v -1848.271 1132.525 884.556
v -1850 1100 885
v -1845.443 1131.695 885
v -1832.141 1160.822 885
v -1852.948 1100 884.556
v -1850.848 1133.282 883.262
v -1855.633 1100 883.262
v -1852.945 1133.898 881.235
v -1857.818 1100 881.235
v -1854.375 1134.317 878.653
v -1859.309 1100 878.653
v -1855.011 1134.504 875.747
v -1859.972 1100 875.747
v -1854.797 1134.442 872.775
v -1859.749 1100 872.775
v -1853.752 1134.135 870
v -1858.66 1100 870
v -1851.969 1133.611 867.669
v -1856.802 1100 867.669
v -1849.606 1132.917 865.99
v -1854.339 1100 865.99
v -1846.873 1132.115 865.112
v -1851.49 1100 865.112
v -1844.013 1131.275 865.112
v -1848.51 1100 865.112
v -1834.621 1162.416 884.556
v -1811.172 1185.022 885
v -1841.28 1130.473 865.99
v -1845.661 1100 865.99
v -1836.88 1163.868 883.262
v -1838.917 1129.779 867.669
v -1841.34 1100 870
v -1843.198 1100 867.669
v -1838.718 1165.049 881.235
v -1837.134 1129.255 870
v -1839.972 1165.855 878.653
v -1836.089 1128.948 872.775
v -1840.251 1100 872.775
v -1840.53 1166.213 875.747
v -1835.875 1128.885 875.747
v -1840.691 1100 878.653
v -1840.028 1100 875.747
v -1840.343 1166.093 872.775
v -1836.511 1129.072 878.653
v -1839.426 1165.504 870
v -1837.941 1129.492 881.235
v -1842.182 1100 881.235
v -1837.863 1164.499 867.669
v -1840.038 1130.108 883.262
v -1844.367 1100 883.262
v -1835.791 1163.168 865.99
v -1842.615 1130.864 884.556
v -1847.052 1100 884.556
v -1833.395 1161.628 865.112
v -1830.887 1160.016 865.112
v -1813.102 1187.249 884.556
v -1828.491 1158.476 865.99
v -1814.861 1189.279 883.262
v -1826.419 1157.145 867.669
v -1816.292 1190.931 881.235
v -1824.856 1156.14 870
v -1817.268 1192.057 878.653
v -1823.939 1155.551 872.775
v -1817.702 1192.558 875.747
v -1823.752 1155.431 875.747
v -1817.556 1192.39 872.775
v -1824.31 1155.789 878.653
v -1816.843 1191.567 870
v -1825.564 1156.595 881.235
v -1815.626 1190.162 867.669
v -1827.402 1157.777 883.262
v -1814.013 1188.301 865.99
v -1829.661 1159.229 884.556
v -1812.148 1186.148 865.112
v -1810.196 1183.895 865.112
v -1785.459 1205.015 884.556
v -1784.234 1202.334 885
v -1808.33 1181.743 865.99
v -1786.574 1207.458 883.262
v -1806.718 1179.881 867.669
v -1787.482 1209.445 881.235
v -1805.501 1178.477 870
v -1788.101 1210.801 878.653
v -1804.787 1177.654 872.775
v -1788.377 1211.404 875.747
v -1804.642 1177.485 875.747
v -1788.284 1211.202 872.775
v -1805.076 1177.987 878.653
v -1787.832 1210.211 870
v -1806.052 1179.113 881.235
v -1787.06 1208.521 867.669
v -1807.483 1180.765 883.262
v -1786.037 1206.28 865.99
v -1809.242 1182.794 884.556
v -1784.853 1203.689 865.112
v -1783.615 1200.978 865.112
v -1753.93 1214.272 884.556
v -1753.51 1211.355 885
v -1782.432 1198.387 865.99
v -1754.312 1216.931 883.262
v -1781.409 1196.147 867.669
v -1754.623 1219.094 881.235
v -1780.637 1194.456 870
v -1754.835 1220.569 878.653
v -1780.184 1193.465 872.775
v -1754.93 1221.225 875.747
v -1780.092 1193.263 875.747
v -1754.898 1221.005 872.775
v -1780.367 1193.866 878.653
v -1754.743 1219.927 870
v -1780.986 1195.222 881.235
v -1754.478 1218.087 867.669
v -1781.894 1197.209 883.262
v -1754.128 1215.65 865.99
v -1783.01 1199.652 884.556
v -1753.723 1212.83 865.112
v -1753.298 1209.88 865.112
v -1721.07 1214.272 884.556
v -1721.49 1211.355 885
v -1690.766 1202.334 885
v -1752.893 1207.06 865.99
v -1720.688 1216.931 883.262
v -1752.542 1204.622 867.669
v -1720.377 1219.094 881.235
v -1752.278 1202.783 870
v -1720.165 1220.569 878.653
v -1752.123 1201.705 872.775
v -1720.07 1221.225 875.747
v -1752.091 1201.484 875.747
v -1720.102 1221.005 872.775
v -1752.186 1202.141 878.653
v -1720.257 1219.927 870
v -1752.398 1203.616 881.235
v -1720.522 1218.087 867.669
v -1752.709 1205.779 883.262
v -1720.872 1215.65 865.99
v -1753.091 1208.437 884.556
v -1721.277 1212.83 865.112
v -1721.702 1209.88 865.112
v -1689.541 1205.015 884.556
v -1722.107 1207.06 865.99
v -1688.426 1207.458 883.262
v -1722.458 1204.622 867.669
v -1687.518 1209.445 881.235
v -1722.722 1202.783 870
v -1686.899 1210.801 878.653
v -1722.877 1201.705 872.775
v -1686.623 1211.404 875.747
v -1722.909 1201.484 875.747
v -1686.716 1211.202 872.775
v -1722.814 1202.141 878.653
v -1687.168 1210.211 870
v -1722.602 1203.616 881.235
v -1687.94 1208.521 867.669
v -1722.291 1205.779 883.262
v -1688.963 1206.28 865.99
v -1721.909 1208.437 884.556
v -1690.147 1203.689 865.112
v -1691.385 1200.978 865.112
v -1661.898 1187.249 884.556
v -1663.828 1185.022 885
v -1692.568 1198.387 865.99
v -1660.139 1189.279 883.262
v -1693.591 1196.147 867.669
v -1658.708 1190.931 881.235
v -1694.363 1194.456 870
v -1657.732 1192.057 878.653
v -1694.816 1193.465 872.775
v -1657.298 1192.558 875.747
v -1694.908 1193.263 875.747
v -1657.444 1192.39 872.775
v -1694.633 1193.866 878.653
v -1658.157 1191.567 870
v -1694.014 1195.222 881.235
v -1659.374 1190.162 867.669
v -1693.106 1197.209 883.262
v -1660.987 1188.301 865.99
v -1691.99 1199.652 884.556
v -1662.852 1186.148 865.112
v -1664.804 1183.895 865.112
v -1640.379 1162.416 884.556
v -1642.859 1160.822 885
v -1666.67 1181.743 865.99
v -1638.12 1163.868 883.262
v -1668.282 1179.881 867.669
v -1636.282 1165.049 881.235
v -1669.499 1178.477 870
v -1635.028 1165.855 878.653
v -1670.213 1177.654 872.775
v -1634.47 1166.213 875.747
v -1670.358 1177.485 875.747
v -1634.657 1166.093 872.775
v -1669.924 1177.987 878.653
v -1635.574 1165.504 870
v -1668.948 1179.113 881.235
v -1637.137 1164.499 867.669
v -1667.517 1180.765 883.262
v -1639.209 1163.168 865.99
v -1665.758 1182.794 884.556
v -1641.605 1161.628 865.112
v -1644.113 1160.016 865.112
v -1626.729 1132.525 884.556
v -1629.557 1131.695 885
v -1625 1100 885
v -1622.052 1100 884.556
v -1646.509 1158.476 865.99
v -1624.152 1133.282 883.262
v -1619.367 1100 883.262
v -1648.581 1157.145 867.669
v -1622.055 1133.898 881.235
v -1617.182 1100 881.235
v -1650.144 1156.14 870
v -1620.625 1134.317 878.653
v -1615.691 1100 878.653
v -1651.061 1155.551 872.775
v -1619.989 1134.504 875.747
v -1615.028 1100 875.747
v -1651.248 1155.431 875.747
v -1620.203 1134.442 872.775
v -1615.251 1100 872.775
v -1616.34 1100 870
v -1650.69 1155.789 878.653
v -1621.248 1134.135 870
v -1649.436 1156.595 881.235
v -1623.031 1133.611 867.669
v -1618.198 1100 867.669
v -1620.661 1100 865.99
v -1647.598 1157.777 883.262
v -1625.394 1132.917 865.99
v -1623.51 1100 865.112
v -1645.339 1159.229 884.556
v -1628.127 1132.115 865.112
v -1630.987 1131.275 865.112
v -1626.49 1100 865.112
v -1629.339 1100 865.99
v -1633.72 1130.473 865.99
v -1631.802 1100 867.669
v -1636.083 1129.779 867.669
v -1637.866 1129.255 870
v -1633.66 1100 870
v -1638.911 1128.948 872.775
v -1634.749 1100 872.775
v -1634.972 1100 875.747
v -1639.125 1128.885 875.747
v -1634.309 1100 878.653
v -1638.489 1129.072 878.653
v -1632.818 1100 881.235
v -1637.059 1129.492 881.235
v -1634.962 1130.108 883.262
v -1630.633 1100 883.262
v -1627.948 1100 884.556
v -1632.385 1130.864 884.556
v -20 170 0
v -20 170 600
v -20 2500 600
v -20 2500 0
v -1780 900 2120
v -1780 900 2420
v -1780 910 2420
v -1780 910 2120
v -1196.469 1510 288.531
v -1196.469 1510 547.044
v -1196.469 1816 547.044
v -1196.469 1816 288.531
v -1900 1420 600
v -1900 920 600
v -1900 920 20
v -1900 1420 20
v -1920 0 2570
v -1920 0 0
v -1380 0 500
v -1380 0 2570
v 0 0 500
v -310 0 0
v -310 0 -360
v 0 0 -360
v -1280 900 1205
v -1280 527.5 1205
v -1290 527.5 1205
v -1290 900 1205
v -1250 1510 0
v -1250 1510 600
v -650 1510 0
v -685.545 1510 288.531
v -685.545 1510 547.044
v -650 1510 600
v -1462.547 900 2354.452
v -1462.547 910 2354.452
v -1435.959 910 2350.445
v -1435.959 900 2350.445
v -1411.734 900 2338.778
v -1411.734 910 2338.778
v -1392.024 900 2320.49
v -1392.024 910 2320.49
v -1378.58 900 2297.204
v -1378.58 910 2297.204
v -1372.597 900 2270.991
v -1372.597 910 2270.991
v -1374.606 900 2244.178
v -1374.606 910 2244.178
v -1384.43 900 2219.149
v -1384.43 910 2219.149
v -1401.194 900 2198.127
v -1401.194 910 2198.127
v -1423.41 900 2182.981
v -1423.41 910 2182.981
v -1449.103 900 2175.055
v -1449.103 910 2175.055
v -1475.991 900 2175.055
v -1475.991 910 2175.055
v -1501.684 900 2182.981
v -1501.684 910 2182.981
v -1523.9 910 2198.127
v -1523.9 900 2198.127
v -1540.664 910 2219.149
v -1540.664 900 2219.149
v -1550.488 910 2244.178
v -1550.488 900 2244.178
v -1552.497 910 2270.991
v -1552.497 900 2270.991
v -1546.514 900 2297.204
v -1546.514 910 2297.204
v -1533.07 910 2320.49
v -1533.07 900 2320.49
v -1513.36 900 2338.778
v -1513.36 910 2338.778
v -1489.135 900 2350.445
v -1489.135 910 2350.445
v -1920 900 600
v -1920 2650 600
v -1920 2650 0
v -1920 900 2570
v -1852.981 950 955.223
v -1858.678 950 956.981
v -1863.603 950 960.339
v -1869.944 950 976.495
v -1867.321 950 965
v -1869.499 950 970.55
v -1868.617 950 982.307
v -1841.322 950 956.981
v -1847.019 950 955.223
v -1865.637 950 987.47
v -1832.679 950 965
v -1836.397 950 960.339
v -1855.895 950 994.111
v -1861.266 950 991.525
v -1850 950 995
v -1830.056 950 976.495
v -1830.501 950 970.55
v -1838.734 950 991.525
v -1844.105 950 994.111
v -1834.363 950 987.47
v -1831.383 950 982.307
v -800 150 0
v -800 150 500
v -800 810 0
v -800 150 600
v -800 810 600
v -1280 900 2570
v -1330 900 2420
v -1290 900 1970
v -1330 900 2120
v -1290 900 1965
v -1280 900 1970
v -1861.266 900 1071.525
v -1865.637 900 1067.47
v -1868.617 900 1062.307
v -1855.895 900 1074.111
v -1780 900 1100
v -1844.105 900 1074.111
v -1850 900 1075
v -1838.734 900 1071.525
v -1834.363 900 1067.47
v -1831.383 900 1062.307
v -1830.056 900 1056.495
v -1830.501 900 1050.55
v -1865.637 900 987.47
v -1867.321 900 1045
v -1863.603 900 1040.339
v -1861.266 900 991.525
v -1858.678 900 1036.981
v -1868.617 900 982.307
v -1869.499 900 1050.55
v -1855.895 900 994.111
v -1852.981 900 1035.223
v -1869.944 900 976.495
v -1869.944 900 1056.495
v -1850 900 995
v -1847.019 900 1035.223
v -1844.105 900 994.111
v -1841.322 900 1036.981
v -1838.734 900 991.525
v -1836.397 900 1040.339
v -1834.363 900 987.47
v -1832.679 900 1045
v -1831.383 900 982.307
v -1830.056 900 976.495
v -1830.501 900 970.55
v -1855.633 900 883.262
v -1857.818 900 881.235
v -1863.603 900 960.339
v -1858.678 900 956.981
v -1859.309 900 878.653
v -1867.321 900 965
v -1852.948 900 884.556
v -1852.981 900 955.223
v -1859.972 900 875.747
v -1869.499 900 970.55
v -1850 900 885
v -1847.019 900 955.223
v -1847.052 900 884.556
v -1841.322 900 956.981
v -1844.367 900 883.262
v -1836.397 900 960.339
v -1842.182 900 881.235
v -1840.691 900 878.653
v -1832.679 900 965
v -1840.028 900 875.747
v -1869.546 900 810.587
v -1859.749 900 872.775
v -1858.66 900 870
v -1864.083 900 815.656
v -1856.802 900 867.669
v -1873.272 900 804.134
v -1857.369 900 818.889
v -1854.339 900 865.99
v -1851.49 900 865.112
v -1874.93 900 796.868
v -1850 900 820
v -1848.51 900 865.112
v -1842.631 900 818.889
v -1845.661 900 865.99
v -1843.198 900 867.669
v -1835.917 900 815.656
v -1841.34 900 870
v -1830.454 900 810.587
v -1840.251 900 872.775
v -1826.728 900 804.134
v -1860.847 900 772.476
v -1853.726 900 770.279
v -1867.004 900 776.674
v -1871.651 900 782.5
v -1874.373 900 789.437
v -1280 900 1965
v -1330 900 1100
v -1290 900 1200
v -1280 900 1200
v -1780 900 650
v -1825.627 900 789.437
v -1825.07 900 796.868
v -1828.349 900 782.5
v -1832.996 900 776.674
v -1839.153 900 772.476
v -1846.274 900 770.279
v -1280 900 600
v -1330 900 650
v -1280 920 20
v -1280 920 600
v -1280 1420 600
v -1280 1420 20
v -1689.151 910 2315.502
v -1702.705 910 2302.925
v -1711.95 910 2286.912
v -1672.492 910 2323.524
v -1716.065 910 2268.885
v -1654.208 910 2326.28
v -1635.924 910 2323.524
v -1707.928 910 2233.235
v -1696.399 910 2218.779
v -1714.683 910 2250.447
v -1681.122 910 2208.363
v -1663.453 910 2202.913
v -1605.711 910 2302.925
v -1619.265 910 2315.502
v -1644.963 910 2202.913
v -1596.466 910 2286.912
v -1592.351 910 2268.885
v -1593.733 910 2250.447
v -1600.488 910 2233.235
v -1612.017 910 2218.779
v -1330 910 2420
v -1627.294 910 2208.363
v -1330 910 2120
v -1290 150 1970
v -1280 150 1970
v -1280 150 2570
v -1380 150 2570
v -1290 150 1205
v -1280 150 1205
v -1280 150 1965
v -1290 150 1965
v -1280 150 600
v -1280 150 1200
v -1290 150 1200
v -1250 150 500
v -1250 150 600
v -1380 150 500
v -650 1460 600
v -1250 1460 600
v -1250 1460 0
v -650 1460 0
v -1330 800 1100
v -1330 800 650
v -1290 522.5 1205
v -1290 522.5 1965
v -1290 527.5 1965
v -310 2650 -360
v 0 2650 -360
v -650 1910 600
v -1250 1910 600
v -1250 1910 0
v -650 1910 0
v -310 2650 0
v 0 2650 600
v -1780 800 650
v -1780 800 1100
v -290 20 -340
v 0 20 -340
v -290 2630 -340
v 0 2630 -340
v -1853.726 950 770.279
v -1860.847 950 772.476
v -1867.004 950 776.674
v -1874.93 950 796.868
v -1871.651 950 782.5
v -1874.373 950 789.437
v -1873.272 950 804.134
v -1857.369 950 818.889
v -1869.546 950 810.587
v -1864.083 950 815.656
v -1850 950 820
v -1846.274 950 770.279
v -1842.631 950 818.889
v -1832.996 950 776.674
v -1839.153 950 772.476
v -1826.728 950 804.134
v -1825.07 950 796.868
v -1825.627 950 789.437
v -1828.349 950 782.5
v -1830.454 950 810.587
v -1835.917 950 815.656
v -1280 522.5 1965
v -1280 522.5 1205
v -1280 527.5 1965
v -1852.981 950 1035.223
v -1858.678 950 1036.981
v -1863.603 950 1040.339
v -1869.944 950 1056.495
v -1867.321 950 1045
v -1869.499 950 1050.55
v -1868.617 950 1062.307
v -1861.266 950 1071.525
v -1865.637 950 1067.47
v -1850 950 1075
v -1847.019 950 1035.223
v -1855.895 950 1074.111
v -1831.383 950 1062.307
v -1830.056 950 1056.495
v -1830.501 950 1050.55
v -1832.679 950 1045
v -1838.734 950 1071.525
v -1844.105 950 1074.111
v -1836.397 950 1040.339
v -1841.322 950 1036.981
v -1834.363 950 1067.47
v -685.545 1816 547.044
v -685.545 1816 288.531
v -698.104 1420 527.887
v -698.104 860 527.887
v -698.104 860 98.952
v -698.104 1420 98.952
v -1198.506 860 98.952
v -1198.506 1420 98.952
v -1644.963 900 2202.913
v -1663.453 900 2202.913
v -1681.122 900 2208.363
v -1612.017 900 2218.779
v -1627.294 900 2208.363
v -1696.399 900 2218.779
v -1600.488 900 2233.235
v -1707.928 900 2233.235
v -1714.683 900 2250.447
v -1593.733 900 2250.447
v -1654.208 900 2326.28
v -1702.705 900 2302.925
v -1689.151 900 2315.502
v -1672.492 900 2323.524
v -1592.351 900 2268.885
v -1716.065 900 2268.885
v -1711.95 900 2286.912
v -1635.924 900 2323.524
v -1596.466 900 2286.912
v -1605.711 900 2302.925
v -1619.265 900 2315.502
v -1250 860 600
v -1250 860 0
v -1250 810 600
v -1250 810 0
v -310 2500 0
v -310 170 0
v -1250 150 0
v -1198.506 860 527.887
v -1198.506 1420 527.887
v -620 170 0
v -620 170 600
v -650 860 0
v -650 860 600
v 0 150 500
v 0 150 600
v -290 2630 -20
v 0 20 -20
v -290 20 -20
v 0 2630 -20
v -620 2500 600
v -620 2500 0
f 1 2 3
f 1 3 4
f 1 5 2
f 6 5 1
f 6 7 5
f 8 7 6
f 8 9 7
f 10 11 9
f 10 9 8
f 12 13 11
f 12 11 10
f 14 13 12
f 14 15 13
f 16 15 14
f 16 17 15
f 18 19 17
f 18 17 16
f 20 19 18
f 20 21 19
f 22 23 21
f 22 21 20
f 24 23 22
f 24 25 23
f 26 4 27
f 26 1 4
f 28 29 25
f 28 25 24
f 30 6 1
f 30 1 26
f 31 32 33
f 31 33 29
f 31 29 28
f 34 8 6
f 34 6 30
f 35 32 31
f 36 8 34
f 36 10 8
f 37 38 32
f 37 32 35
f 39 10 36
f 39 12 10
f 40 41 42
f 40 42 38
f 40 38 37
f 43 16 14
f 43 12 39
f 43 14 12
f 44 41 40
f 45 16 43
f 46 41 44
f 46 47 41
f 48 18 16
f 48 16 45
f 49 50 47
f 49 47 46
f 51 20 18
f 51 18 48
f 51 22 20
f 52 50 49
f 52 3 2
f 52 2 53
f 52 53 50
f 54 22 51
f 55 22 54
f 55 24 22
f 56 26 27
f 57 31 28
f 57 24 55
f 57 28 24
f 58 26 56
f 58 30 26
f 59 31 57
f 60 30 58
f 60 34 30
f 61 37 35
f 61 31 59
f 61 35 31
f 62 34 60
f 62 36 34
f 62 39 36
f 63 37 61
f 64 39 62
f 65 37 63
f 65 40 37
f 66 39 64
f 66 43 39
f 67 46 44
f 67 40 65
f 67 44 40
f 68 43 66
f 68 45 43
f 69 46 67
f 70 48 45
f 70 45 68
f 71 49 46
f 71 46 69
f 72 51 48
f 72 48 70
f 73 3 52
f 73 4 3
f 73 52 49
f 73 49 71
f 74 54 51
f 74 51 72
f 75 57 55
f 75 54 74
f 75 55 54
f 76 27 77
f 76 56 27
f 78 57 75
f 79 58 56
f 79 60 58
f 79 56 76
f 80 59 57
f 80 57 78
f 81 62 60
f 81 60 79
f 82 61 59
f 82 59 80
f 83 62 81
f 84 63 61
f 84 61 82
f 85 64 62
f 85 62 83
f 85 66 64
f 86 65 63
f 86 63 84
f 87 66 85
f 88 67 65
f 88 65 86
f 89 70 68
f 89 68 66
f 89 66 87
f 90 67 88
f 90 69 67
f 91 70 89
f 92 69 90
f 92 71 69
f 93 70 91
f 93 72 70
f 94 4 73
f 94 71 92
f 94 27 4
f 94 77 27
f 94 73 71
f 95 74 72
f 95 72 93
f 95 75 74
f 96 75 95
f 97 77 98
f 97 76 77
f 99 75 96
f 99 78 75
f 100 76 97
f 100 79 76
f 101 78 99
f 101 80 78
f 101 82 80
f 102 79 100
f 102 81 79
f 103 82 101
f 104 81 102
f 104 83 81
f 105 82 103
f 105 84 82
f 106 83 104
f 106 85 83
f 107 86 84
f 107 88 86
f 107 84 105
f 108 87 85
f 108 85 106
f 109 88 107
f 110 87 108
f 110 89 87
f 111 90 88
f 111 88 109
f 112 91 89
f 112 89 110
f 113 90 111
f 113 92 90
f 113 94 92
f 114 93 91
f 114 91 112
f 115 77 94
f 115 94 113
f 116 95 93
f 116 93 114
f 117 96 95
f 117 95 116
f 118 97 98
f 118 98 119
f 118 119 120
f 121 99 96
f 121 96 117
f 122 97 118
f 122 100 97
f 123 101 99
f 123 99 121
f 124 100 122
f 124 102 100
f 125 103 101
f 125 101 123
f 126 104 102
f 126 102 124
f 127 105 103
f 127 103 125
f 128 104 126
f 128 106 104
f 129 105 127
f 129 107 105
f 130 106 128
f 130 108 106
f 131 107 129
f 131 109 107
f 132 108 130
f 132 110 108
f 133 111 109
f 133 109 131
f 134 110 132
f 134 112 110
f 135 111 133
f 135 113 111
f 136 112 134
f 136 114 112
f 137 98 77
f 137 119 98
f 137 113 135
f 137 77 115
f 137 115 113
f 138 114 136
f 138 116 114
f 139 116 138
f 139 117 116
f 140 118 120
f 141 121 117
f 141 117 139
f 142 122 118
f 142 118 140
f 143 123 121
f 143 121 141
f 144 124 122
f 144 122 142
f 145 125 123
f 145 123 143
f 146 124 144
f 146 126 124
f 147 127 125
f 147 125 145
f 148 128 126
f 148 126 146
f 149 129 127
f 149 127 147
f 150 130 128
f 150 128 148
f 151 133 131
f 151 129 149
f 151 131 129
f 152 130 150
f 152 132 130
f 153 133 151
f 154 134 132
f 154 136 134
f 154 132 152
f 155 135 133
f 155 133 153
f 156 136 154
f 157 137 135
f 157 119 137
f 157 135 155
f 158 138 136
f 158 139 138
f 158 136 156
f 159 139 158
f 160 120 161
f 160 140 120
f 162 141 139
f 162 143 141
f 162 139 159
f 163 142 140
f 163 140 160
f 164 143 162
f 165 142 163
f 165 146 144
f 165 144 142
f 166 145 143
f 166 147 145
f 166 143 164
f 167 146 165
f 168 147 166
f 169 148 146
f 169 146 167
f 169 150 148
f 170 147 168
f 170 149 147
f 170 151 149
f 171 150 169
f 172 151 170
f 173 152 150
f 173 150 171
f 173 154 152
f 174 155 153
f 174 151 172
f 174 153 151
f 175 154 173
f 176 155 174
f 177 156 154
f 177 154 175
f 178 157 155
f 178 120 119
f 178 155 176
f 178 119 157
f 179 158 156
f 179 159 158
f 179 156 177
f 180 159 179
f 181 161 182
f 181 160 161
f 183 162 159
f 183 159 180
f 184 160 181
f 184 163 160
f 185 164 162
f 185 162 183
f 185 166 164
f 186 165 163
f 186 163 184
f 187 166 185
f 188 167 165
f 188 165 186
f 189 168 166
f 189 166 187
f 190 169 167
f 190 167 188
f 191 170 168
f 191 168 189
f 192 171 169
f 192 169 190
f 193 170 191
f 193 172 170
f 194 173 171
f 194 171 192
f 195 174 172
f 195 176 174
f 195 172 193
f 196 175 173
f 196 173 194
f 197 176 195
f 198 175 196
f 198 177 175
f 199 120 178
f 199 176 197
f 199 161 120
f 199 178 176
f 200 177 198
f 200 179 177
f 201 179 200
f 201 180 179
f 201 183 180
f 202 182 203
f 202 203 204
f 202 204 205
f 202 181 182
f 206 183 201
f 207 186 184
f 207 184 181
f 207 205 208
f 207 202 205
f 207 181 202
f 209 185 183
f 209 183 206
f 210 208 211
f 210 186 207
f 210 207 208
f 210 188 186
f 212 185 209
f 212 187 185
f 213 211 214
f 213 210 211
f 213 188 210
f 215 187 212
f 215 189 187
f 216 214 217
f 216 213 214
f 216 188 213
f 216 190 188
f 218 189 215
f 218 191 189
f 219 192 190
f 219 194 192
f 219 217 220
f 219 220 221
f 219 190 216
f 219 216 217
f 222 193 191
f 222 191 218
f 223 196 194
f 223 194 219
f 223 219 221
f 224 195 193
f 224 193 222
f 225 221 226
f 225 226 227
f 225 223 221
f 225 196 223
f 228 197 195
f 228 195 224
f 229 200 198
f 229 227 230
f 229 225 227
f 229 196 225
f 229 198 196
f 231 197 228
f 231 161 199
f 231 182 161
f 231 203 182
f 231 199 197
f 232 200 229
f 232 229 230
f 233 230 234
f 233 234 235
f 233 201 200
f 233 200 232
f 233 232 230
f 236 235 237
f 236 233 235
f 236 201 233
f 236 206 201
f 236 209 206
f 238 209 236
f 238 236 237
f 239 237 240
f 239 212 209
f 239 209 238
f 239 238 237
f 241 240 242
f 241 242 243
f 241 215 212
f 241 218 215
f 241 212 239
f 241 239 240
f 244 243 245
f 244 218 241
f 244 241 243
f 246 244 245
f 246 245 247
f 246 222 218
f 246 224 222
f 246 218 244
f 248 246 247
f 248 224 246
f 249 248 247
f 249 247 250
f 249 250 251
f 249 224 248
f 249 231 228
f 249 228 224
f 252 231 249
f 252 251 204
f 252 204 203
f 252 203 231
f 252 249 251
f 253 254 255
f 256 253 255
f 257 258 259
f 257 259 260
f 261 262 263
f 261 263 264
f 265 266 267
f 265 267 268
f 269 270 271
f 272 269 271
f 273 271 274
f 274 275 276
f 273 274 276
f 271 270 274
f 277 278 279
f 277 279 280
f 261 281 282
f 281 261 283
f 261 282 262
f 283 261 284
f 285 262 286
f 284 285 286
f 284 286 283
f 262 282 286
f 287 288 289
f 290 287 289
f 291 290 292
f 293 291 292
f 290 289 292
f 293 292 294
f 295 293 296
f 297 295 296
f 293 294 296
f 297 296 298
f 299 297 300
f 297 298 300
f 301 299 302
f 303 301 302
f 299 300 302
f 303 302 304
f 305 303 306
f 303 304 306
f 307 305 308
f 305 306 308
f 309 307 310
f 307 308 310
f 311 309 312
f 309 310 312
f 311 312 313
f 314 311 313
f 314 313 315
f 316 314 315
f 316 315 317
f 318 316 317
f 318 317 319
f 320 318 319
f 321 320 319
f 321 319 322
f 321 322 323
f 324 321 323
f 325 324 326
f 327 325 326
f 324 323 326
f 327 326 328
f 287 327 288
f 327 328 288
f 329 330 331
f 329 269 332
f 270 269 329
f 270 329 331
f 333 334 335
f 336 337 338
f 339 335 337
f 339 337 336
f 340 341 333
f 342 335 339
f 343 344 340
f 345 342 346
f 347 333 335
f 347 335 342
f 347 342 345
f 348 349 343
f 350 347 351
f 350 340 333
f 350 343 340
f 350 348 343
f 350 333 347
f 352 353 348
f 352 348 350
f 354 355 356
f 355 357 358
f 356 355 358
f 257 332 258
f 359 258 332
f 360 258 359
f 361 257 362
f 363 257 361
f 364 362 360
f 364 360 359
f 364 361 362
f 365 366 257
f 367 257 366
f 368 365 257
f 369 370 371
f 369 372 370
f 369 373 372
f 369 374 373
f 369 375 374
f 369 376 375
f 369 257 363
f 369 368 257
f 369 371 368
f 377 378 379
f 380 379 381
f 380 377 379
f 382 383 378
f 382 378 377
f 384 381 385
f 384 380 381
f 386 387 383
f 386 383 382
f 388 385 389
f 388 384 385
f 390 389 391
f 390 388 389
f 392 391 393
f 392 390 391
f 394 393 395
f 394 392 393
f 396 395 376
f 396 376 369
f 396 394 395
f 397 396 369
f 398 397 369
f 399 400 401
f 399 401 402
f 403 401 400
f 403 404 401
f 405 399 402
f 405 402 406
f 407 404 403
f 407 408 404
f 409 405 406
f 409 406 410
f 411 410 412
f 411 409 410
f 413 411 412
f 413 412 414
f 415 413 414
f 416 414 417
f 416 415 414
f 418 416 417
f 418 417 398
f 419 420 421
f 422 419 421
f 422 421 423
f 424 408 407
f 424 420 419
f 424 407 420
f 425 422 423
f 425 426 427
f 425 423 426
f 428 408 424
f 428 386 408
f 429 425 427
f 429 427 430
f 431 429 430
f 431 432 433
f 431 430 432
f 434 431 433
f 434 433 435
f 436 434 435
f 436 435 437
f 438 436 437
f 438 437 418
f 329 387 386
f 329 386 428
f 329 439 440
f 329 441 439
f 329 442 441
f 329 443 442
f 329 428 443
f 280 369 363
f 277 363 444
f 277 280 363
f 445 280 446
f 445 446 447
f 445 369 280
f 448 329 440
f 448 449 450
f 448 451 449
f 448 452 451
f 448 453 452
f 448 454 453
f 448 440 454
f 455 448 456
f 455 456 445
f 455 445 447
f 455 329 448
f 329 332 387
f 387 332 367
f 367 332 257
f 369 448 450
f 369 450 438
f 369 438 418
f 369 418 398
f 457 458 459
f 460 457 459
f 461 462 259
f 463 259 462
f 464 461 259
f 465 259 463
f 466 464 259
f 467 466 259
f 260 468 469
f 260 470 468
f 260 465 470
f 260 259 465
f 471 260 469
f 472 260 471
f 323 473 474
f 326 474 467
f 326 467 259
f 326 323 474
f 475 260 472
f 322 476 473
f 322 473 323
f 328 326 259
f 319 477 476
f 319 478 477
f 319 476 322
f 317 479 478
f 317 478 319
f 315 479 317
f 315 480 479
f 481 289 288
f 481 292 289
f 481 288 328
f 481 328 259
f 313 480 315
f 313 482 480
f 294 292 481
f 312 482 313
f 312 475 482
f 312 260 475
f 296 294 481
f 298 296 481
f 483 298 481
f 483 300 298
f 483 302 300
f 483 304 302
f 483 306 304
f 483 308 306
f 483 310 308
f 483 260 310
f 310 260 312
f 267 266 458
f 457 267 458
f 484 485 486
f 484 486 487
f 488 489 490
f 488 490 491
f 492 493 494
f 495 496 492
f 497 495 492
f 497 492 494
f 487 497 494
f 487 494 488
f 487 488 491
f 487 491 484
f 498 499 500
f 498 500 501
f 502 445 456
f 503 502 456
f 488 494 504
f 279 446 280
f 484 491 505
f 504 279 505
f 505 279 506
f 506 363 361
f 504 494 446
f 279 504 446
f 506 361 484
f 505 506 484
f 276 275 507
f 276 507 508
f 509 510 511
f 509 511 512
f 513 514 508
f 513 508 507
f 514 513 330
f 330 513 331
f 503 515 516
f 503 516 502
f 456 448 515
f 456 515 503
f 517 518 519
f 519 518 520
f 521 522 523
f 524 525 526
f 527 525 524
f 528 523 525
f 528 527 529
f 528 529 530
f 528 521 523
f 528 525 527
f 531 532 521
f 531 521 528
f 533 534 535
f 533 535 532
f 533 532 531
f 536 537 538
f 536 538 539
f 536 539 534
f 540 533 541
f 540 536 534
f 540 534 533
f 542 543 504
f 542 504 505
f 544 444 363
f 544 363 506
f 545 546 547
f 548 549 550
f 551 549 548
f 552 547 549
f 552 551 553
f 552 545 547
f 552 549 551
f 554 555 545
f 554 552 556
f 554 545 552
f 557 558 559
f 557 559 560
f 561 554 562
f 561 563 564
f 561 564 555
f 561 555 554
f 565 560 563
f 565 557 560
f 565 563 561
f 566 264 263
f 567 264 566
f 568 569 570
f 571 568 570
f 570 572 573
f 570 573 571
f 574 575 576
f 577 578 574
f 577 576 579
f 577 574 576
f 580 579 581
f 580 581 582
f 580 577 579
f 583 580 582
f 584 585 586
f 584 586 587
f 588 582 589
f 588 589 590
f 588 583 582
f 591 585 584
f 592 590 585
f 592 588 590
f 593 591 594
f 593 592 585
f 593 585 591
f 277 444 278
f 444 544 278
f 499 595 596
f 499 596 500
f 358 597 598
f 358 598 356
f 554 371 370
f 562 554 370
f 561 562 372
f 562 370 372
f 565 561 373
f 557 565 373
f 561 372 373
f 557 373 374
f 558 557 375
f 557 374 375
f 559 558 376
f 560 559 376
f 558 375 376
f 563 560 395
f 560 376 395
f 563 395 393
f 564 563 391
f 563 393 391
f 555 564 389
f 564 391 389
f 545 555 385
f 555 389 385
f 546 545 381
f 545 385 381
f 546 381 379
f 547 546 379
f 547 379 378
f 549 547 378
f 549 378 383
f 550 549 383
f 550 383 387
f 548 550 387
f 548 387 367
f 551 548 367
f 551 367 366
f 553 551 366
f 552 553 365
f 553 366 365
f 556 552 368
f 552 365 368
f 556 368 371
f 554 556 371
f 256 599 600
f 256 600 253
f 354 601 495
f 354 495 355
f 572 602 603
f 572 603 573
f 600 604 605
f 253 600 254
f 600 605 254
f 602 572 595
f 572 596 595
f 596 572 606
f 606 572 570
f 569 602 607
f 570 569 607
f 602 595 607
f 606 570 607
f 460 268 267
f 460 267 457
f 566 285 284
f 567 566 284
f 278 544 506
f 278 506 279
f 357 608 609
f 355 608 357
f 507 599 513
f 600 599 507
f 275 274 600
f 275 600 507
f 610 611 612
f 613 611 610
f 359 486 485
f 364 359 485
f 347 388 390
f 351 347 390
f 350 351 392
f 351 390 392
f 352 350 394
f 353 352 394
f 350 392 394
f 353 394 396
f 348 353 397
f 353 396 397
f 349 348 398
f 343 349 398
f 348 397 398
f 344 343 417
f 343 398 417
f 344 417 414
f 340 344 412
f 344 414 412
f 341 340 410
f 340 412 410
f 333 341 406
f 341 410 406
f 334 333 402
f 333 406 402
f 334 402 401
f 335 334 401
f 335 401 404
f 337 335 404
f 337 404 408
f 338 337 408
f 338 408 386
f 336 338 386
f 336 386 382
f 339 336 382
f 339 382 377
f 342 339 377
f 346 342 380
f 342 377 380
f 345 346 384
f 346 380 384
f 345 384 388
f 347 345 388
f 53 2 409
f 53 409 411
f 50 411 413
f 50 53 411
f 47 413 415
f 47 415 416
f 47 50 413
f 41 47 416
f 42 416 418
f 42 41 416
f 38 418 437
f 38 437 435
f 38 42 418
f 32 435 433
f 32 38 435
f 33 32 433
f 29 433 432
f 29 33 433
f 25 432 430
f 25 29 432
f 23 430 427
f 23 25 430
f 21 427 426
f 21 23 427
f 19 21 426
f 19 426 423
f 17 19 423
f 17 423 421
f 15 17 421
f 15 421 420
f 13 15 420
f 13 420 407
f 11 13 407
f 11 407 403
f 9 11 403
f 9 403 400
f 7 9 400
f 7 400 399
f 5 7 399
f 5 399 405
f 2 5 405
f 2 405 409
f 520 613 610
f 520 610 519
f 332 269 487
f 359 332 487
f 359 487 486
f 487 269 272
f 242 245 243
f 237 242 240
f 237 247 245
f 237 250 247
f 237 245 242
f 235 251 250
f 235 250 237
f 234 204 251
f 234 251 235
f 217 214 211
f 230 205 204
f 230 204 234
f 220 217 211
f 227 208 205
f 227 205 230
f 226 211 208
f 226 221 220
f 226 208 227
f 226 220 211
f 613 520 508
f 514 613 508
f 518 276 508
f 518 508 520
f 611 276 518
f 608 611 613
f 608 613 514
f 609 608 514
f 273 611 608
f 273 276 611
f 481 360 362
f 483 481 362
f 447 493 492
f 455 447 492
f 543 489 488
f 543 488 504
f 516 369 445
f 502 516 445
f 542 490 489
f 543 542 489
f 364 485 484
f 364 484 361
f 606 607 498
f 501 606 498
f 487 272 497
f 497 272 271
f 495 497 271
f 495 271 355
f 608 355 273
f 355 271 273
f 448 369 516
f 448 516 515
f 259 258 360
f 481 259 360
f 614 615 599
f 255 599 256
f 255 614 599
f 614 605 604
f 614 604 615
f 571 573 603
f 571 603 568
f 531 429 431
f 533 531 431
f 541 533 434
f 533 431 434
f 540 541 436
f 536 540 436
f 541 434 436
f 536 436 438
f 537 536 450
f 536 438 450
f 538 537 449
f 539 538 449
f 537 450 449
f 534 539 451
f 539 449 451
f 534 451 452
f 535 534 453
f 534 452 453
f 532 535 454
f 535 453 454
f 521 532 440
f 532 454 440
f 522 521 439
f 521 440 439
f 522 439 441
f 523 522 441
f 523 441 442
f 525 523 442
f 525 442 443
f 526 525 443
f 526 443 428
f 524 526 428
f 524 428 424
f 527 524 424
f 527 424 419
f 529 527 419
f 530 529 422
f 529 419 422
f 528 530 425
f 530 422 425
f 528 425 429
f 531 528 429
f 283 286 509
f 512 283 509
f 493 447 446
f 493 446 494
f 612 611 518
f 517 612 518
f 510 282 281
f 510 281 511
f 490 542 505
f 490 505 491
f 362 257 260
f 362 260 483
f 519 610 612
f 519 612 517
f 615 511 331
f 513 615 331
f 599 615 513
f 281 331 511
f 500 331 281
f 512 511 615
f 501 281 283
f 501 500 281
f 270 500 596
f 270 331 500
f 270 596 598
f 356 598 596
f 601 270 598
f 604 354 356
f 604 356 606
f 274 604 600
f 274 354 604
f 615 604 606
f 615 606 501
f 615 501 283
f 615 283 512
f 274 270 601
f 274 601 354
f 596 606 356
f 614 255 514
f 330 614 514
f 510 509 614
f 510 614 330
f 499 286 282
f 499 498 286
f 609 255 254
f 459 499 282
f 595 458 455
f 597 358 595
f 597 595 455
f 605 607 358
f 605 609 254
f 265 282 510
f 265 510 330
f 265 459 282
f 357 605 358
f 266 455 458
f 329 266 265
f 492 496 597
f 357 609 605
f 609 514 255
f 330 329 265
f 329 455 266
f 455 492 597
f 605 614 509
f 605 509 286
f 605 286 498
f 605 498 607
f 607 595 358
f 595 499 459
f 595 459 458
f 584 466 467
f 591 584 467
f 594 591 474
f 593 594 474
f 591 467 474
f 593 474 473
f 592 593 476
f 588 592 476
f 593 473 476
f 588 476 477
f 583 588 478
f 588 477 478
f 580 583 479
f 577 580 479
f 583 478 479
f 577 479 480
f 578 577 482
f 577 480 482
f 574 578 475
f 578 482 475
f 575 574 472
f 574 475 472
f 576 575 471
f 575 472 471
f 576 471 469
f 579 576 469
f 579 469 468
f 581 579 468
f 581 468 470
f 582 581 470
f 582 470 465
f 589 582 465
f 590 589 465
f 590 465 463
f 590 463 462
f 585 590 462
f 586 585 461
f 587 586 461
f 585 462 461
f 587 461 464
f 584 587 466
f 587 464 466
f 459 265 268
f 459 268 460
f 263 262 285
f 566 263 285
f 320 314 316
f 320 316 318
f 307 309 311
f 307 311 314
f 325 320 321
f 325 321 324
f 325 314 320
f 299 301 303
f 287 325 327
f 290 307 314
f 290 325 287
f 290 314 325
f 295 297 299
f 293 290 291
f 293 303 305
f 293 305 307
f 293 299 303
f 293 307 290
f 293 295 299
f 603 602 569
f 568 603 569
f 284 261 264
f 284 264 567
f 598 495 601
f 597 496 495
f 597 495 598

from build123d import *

# Parameters (mm, degrees)
EXTRUDE_1_DEPTH      = 900
EXTRUDE_2_DEPTH      = 1750
CUT_EXTRUDE_1_DEPTH  = 150
SKETCH_5_W           = 600
SKETCH_5_H           = 2330
CUT_EXTRUDE_3_DEPTH  = 600
CUT_EXTRUDE_4_REACH  = 3821.66
SKETCH_6_W           = 450
SKETCH_6_H           = 660
SKETCH_7_W           = 600
SKETCH_7_H           = 600
CUT_EXTRUDE_5_DEPTH  = 600
SKETCH_8_W           = 600
SKETCH_8_H           = 400
CUT_EXTRUDE_6_DEPTH  = 600
SKETCH_9_W           = 320
SKETCH_9_H           = 2610
CUT_EXTRUDE_7_DEPTH  = 290
SKETCH_10_W          = 450
SKETCH_10_H          = 450
CUT_EXTRUDE_8_DEPTH  = 100
SKETCH_11_W          = 620
SKETCH_11_H          = 500
CUT_EXTRUDE_9_DEPTH  = 580
SKETCH_12_W          = 450
SKETCH_12_H          = 300
EXTRUDE_3_DEPTH      = 10
SKETCH_13_R          = 62.030124837
SKETCH_13_R_2        = 90.202132014
CUT_EXTRUDE_10_DEPTH = 10
CUT_EXTRUDE_11_DEPTH = 10
SWEEP_1_PROFILE_R    = 10
SKETCH_21_R          = 20
SKETCH_21_R_2        = 25
EXTRUDE_4_DEPTH      = 50
SKETCH_22_W          = 510.923596237
SKETCH_22_H          = 258.513078401
EXTRUDE_5_DEPTH      = 306
SKETCH_23_W          = 500.401819184
SKETCH_23_H          = 428.934094681
EXTRUDE_6_DEPTH      = 560


with BuildPart() as part:
    # Эскиз1 → Бобышка-Вытянуть1 (new body)
    with BuildSketch(Plane(origin=(0, 0, 0), x_dir=(1, 0, 0), z_dir=(0, 1, 0))):
        Polygon((-310, 0), (-1920, 0), (-1920, -2570), (-1280, -2570), (-1280, -600), (0, -600), (0, 0), (0, 360), (-310, 360), align=None)
    extrude(amount=EXTRUDE_1_DEPTH)

    # Эскиз2 → Бобышка-Вытянуть2 (add)
    with BuildSketch(Plane(origin=(0, 900, 0), x_dir=(1, 0, 0), z_dir=(0, 1, 0))):
        Polygon((-1920, 0), (-310, 0), (-310, 360), (0, 360), (0, -600), (-1920, -600), align=None)
    extrude(amount=EXTRUDE_2_DEPTH)

    # Эскиз4 → Вырез-Вытянуть1 (cut)
    with BuildSketch(Plane(origin=(0, 0, 0), x_dir=(-1, 0, 0), z_dir=(0, -1, 0))):
        Polygon((1280, -2570), (1380, -2570), (1380, -500), (0, -500), (0, -600), (1280, -600), align=None)
    extrude(amount=-CUT_EXTRUDE_1_DEPTH, mode=Mode.SUBTRACT)

    # Эскиз5 → Вырез-Вытянуть3 (cut)
    with BuildSketch(Plane.XY.offset(600)):
        with Locations((-320, 1335)):
            Rectangle(SKETCH_5_W, SKETCH_5_H)
    extrude(amount=-CUT_EXTRUDE_3_DEPTH, mode=Mode.SUBTRACT)

    # Вырез-Вытянуть4: up to this face of the body (flat: up to its plane)
    cut_extrude_4_end = Plane(part.part.faces().sort_by_distance((-1247.46854015, 1322.962022459, 0))[0])
    # Эскиз6 → Вырез-Вытянуть4 (cut, up to the picked face)
    with BuildSketch(Plane.XY.offset(600), mode=Mode.PRIVATE) as cut_extrude_4_sk1:
        with Locations((-1025, 480)):
            Rectangle(SKETCH_6_W, SKETCH_6_H)
    cut_extrude_4_tool1 = split(extrude(cut_extrude_4_sk1.sketch, amount=-CUT_EXTRUDE_4_REACH, mode=Mode.PRIVATE), bisect_by=cut_extrude_4_end, keep=Keep.BOTH, mode=Mode.PRIVATE)
    add(cut_extrude_4_tool1.solids().sort_by(Axis((-1025, 480, 600), (0, 0, -1)))[0], mode=Mode.SUBTRACT)

    # Эскиз7 → Вырез-Вытянуть5 (cut)
    with BuildSketch(Plane.XY.offset(600)):
        with Locations((-950, 1160)):
            Rectangle(SKETCH_7_W, SKETCH_7_H)
    extrude(amount=-CUT_EXTRUDE_5_DEPTH, mode=Mode.SUBTRACT)

    # Эскиз8 → Вырез-Вытянуть6 (cut)
    with BuildSketch(Plane.XY.offset(600)):
        with Locations((-950, 1710)):
            Rectangle(SKETCH_8_W, SKETCH_8_H)
    extrude(amount=-CUT_EXTRUDE_6_DEPTH, mode=Mode.SUBTRACT)

    # Эскиз9 → Вырез-Вытянуть7 (cut)
    with BuildSketch(Plane(origin=(0, 0, 0), x_dir=(0, 0, -1), z_dir=(1, 0, 0))):
        with Locations((180, 1325)):
            Rectangle(SKETCH_9_W, SKETCH_9_H)
    extrude(amount=-CUT_EXTRUDE_7_DEPTH, mode=Mode.SUBTRACT)

    # Эскиз10 → Вырез-Вытянуть8 (cut)
    with BuildSketch(Plane(origin=(0, 900, 0), x_dir=(1, 0, 0), z_dir=(0, 1, 0))):
        with Locations((-1555, -875)):
            Rectangle(SKETCH_10_W, SKETCH_10_H)
    extrude(amount=-CUT_EXTRUDE_8_DEPTH, mode=Mode.SUBTRACT)

    # Эскиз11 → Вырез-Вытянуть9 (cut)
    with BuildSketch(Plane.XY.offset(600)):
        with Locations((-1590, 1170)):
            Rectangle(SKETCH_11_W, SKETCH_11_H)
    extrude(amount=-CUT_EXTRUDE_9_DEPTH, mode=Mode.SUBTRACT)

    # Эскиз12 → Бобышка-Вытянуть3 (add)
    with BuildSketch(Plane(origin=(0, 900, 0), x_dir=(1, 0, 0), z_dir=(0, 1, 0))):
        with Locations((-1555, -2270)):
            Rectangle(SKETCH_12_W, SKETCH_12_H)
    extrude(amount=EXTRUDE_3_DEPTH)

    # Эскиз13 → Вырез-Вытянуть10 (cut)
    with BuildSketch(Plane(origin=(0, 910, 0), x_dir=(1, 0, 0), z_dir=(0, 1, 0))):
        with Locations(Location((-1654.208045563, -2264.249851764, 0), (0, 0, 270))):
            Circle(SKETCH_13_R)
        with Locations(Location((-1462.546999968, -2264.249851764, 0), (0, 0, 270))):
            Circle(SKETCH_13_R_2)
    extrude(amount=-CUT_EXTRUDE_10_DEPTH, mode=Mode.SUBTRACT)

    # Эскиз14 → Вырез-Вытянуть11 (cut)
    with BuildSketch(Plane(origin=(-1280, 0, 0), x_dir=(0, 0, -1), z_dir=(1, 0, 0))):
        Polygon((-1970, 900), (-1965, 900), (-1965, 527.5), (-1205, 527.5), (-1205, 900), (-1200, 900), (-1200, 150), (-1205, 150), (-1205, 522.5), (-1965, 522.5), (-1965, 150), (-1970, 150), align=None)
    extrude(amount=-CUT_EXTRUDE_11_DEPTH, mode=Mode.SUBTRACT)

    # По траектории1: sweep along a curve in space
    with BuildLine() as sweep_1_path:
        Line((-1850, 900, 875), (-1850, 1100, 875))
        ThreePointArc((-1850, 1100, 875), (-1737.5, 1212.5, 875), (-1625, 1100, 875))
    # По траектории1 profile (on start of the path) → По траектории1 (sweep)
    with BuildSketch(Plane(origin=(-1850, 900, 875), x_dir=(0, 0, 1), z_dir=(0, 1, 0))):
        Circle(SWEEP_1_PROFILE_R)
    sweep(path=sweep_1_path.line)

    # Эскиз21 → Бобышка-Вытянуть4 (add)
    with BuildSketch(Plane(origin=(0, 900, 0), x_dir=(1, 0, 0), z_dir=(0, 1, 0))):
        with Locations(Location((-1850, -975, 0), (0, 0, 270))):
            Circle(SKETCH_21_R)
        with Locations(Location((-1850, -1055, 0), (0, 0, 270))):
            Circle(SKETCH_21_R)
        with Locations(Location((-1850, -795, 0), (0, 0, 270))):
            Circle(SKETCH_21_R_2)
    extrude(amount=EXTRUDE_4_DEPTH)

    # Эскиз22 → Бобышка-Вытянуть5 (add)
    with BuildSketch(Plane(origin=(0, 1510, 0), x_dir=(1, 0, 0), z_dir=(0, 1, 0))):
        with Locations((-941.007183296, -417.787145218)):
            Rectangle(SKETCH_22_W, SKETCH_22_H)
    extrude(amount=EXTRUDE_5_DEPTH)

    # Эскиз23 → Бобышка-Вытянуть6 (add)
    with BuildSketch(Plane(origin=(0, 860, 0), x_dir=(1, 0, 0), z_dir=(0, 1, 0))):
        with Locations((-948.304788949, -313.419513713)):
            Rectangle(SKETCH_23_W, SKETCH_23_H)
    extrude(amount=EXTRUDE_6_DEPTH)


solid = part.part
